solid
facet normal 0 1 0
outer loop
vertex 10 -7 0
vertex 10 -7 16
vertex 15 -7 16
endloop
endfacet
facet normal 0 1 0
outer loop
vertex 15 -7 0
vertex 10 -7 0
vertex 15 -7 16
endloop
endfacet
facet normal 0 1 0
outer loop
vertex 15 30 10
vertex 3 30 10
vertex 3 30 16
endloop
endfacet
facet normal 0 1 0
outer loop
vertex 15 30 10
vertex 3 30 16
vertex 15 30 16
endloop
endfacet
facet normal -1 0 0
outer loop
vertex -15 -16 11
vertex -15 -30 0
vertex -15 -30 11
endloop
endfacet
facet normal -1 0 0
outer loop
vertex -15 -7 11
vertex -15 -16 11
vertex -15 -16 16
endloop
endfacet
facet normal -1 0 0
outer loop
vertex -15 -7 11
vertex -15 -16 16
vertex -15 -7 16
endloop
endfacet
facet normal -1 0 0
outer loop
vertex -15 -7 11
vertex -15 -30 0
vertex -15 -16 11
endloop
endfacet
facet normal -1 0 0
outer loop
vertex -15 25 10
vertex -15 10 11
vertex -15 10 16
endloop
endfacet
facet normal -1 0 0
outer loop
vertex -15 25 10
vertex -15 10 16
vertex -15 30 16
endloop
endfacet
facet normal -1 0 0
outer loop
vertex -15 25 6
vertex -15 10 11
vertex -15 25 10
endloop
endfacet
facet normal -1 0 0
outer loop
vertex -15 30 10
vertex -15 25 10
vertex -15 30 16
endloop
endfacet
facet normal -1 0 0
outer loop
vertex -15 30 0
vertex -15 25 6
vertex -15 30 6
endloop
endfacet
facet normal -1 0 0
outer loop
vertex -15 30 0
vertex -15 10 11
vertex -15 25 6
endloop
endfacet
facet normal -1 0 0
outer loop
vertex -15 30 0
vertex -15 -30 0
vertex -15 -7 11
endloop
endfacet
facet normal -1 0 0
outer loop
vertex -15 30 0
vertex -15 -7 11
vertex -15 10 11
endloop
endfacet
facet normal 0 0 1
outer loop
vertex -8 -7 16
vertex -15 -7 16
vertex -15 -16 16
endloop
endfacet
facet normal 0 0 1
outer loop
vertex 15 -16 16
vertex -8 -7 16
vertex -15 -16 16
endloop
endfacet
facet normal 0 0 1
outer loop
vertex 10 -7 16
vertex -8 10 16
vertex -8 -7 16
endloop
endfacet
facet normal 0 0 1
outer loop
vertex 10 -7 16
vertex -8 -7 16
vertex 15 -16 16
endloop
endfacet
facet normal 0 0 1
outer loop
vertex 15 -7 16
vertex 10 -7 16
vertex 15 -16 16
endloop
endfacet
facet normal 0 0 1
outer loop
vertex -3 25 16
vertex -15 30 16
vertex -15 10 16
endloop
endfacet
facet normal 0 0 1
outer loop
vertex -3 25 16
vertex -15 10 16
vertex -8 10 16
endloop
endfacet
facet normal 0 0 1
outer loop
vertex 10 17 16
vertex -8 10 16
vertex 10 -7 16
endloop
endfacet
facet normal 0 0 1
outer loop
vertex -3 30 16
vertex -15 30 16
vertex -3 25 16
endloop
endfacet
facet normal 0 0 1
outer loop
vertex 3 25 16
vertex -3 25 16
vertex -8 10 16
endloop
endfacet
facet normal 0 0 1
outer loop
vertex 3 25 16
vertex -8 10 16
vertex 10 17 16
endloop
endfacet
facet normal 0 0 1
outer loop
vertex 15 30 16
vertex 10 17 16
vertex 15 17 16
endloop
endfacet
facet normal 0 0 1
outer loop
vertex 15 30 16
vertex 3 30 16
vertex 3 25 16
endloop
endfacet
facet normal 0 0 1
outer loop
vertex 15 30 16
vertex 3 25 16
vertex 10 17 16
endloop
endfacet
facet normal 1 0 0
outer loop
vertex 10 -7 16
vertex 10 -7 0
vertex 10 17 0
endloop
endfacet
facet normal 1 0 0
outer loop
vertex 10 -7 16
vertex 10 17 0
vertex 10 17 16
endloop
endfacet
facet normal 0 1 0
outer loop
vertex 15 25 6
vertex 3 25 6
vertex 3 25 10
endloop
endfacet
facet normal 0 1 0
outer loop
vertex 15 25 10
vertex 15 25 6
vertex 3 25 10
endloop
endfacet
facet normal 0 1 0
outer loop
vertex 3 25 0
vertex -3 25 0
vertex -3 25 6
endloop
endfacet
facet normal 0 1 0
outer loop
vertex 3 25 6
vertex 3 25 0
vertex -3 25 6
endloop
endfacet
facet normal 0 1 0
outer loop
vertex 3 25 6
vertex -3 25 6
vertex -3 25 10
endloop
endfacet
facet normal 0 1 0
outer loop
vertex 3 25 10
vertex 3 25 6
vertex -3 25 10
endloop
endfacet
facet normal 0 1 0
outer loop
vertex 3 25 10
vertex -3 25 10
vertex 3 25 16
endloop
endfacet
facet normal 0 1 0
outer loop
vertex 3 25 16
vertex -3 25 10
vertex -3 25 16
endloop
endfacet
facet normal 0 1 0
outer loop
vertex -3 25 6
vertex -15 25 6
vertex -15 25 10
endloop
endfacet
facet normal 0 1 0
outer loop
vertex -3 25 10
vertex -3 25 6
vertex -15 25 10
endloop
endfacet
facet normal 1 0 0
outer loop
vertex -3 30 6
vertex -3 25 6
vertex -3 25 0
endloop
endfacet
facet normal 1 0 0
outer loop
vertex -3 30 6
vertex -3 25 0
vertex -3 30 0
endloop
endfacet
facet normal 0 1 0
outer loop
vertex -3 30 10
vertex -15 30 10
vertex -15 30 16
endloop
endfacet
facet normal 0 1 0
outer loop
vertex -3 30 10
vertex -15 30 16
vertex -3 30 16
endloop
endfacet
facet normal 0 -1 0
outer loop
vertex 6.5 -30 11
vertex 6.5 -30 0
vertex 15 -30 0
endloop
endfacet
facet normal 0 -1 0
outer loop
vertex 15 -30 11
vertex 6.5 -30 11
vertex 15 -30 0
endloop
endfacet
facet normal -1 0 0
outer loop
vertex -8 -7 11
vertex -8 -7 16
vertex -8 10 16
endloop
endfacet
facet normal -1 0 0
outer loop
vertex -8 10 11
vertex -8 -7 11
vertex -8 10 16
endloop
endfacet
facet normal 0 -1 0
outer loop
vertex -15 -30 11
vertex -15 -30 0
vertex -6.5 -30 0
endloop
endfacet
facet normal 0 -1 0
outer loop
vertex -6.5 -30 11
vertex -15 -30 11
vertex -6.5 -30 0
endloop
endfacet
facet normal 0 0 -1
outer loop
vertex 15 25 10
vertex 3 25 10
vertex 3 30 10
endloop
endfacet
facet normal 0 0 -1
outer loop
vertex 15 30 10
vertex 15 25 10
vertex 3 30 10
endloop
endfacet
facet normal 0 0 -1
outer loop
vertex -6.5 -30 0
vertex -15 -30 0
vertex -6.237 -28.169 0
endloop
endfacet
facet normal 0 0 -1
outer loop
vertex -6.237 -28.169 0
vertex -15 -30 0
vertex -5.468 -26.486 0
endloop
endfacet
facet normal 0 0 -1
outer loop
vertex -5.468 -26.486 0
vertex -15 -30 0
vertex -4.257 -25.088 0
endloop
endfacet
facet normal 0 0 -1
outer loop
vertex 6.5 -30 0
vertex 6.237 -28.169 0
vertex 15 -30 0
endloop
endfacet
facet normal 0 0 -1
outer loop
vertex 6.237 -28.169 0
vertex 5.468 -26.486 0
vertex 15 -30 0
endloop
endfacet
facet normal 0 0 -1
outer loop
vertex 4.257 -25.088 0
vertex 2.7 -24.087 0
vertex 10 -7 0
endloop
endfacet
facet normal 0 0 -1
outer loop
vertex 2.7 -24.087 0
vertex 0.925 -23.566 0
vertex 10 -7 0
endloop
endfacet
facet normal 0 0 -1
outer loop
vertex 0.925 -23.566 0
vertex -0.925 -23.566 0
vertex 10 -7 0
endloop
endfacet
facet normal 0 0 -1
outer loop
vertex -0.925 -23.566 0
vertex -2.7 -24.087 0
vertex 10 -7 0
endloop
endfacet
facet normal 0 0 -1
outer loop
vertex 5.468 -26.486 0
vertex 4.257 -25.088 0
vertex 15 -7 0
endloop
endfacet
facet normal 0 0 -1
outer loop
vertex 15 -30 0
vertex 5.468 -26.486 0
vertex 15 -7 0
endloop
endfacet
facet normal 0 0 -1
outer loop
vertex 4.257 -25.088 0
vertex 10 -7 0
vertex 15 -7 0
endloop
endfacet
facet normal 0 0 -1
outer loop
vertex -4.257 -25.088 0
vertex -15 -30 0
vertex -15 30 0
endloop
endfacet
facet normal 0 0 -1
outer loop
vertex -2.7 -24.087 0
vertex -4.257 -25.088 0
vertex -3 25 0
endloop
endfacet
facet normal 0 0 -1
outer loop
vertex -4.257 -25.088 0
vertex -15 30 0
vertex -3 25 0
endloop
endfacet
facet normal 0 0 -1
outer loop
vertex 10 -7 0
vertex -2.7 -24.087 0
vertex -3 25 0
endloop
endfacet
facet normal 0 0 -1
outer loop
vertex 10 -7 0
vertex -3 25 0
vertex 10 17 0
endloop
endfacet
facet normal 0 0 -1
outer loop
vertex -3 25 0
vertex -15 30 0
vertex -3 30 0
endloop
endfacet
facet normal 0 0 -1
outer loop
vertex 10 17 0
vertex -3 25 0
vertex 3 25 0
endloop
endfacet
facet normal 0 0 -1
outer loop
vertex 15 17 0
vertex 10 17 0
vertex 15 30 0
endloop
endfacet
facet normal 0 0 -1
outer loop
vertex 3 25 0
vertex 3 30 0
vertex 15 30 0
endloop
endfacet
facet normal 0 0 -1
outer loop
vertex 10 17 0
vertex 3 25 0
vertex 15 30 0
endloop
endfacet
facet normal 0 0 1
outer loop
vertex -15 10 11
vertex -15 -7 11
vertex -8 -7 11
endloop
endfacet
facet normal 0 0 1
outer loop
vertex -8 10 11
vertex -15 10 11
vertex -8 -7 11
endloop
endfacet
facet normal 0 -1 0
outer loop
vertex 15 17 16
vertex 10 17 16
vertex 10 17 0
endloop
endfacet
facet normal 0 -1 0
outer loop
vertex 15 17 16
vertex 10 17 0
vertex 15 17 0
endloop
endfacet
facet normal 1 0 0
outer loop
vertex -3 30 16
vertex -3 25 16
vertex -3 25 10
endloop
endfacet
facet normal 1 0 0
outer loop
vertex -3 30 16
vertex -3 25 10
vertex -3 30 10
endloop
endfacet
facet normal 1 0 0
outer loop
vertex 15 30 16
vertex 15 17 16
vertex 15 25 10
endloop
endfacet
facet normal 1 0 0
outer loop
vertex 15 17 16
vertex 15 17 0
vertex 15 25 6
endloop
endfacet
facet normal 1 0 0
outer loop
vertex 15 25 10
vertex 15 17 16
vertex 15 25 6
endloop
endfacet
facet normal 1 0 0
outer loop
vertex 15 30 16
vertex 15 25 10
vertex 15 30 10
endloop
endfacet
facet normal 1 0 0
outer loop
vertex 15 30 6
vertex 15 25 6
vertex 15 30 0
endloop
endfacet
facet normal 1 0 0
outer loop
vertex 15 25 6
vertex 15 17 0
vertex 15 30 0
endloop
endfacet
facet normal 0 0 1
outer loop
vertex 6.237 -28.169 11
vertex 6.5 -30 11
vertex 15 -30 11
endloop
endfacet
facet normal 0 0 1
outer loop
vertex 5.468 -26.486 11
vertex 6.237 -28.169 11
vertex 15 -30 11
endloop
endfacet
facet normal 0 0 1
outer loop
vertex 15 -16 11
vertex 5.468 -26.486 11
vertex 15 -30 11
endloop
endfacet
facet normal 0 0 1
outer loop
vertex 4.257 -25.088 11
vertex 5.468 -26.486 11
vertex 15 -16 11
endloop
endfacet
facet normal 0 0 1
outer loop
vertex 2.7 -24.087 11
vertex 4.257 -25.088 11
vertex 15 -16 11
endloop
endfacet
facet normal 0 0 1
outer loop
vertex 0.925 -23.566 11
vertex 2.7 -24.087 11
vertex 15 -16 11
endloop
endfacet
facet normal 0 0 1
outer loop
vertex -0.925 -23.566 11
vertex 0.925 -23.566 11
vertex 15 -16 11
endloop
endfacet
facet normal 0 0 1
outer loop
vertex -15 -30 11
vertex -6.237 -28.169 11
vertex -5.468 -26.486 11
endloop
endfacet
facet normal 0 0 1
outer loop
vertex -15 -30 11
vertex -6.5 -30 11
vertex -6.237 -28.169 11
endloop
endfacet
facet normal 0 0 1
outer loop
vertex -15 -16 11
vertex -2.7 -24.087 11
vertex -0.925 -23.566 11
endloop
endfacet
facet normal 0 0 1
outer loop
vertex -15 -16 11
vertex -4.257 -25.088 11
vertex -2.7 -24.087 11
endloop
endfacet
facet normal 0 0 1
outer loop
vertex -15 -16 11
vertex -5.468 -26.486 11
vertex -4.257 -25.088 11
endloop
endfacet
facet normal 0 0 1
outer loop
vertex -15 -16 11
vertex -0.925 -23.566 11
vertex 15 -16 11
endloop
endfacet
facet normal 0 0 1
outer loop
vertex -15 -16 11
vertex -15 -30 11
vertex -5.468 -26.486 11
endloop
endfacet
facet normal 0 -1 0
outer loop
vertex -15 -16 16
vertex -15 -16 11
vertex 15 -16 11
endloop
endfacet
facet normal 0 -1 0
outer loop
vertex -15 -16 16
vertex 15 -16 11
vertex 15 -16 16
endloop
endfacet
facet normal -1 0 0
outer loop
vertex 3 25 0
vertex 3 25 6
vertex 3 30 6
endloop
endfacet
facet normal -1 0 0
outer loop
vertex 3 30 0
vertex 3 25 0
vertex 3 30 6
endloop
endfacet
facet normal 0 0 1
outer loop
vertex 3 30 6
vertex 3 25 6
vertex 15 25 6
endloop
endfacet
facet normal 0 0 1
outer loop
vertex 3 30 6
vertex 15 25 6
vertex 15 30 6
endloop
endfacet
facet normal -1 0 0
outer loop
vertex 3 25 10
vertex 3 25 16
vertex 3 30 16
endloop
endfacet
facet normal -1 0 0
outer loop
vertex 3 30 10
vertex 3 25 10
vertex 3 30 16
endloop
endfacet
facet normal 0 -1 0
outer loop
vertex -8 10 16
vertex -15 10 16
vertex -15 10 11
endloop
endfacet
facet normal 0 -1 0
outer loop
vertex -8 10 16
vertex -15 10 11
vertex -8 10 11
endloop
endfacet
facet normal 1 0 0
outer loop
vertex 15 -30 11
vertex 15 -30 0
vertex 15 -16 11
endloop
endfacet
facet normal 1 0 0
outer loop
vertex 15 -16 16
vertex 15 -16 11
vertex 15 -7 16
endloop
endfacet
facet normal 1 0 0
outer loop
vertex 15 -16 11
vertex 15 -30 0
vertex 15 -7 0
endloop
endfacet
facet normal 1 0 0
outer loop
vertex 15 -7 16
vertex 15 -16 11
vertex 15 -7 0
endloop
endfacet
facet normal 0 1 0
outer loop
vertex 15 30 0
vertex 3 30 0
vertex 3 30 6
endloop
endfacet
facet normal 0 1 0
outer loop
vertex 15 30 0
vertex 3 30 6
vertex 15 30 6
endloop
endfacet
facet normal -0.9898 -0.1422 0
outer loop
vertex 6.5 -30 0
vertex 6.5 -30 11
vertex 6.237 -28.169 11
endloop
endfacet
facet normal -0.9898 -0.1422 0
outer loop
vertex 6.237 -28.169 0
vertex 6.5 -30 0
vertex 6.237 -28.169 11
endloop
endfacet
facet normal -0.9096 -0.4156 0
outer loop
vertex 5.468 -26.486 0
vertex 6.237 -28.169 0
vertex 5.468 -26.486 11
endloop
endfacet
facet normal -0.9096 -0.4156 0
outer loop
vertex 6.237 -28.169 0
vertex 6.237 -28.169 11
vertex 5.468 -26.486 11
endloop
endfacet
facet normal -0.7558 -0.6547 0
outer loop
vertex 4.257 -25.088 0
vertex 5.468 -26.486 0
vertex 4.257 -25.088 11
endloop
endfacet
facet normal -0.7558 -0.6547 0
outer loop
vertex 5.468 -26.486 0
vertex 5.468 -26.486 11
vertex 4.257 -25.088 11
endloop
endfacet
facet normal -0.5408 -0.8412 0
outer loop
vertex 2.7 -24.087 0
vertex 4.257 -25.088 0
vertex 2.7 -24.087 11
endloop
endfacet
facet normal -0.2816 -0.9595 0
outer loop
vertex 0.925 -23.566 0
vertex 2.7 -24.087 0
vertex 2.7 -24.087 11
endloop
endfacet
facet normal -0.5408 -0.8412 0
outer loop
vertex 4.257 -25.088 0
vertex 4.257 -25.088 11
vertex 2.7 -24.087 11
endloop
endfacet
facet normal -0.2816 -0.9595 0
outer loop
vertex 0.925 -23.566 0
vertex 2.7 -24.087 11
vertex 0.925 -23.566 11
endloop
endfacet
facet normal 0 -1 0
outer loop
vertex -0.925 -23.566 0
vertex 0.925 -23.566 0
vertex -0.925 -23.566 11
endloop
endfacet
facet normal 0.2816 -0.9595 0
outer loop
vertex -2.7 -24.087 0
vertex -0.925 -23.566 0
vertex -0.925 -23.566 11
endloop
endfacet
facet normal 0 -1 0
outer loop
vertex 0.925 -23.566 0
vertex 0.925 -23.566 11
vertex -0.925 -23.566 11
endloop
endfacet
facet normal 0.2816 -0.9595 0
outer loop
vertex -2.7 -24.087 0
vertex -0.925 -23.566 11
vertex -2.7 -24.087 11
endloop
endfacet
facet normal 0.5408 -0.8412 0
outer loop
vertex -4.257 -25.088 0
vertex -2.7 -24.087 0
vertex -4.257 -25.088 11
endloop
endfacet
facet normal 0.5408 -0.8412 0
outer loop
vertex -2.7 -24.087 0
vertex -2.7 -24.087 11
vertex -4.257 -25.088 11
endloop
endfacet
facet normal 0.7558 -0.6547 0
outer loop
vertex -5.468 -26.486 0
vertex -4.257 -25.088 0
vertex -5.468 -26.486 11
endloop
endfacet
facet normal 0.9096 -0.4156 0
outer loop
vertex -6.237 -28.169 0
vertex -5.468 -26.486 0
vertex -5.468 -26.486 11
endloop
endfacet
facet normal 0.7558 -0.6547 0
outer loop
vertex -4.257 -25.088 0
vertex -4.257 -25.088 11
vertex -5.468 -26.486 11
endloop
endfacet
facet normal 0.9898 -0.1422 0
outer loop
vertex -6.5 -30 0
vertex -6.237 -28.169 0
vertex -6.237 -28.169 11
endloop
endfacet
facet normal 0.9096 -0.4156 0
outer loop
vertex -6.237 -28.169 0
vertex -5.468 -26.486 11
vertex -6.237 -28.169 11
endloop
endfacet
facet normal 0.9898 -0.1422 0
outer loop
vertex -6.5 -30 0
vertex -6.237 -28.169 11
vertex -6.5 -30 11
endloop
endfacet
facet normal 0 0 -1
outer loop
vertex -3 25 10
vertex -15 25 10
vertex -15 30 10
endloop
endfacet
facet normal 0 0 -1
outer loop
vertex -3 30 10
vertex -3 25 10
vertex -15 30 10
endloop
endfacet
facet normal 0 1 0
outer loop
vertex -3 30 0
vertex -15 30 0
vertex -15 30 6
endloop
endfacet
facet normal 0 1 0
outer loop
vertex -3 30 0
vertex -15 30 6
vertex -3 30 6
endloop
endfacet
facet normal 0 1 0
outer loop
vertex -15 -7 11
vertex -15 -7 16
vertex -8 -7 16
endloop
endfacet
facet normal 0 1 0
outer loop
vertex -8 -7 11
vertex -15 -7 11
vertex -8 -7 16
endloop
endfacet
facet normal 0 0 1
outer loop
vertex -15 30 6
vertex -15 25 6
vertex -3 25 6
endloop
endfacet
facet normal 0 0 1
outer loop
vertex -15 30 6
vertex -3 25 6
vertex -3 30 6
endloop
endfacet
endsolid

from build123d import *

# Parameters (mm, degrees)
SKETCH_1_W          = 30
SKETCH_1_H          = 60
EXTRUDE_1_DEPTH     = 16
SKETCH_2_W          = 4
SKETCH_2_H          = 5
SKETCH_2_W_2        = 5
SKETCH_2_H_2        = 14
CUT_EXTRUDE_1_DEPTH = 46.343136195
SKETCH_3_R          = 6.5
SKETCH_3_W          = 6
SKETCH_3_H          = 5
CUT_EXTRUDE_2_DEPTH = 38.161808352
SKETCH_4_W          = 5
SKETCH_4_H          = 17
CUT_EXTRUDE_3_DEPTH = 38.161808352
SKETCH_5_W          = 7
SKETCH_5_H          = 17
CUT_EXTRUDE_4_DEPTH = 5
SKETCH_6_W          = 5
SKETCH_6_H          = 16
CUT_EXTRUDE_5_DEPTH = 7


with BuildPart() as part:
    # Эскиз1 → Бобышка-Вытянуть1 (new body)
    with BuildSketch(Plane.XY):
        Rectangle(SKETCH_1_W, SKETCH_1_H)
    extrude(amount=EXTRUDE_1_DEPTH)

    # Эскиз2 → Вырез-Вытянуть1 (cut, through all)
    with BuildSketch(Plane.ZY.offset(15)):
        with Locations((8, 27.5)):
            Rectangle(SKETCH_2_W, SKETCH_2_H)
        with Locations((13.5, -23)):
            Rectangle(SKETCH_2_W_2, SKETCH_2_H_2)
    extrude(amount=-CUT_EXTRUDE_1_DEPTH, mode=Mode.SUBTRACT)

    # Эскиз3 → Вырез-Вытянуть2 (cut, through all)
    with BuildSketch(Plane.XY.offset(16)):
        with Locations((0, -30)):
            Circle(SKETCH_3_R)
        with Locations((0, 27.5)):
            Rectangle(SKETCH_3_W, SKETCH_3_H)
    extrude(amount=-CUT_EXTRUDE_2_DEPTH, mode=Mode.SUBTRACT)

    # Эскиз4 → Вырез-Вытянуть3 (cut, through all)
    with BuildSketch(Plane.XY.offset(16)):
        with Locations((12.5, 1.5)):
            Rectangle(SKETCH_4_W, SKETCH_4_H)
    extrude(amount=-CUT_EXTRUDE_3_DEPTH, mode=Mode.SUBTRACT)

    # Эскиз5 → Вырез-Вытянуть4 (cut)
    with BuildSketch(Plane.XY.offset(16)):
        with Locations((-11.5, 1.5)):
            Rectangle(SKETCH_5_W, SKETCH_5_H)
    extrude(amount=-CUT_EXTRUDE_4_DEPTH, mode=Mode.SUBTRACT)

    # Эскиз6 → Вырез-Вытянуть5 (cut)
    with BuildSketch(Plane.XZ.offset(-10)):
        with Locations((12.5, 8)):
            Rectangle(SKETCH_6_W, SKETCH_6_H)
    extrude(amount=-CUT_EXTRUDE_5_DEPTH, mode=Mode.SUBTRACT)


solid = part.part
